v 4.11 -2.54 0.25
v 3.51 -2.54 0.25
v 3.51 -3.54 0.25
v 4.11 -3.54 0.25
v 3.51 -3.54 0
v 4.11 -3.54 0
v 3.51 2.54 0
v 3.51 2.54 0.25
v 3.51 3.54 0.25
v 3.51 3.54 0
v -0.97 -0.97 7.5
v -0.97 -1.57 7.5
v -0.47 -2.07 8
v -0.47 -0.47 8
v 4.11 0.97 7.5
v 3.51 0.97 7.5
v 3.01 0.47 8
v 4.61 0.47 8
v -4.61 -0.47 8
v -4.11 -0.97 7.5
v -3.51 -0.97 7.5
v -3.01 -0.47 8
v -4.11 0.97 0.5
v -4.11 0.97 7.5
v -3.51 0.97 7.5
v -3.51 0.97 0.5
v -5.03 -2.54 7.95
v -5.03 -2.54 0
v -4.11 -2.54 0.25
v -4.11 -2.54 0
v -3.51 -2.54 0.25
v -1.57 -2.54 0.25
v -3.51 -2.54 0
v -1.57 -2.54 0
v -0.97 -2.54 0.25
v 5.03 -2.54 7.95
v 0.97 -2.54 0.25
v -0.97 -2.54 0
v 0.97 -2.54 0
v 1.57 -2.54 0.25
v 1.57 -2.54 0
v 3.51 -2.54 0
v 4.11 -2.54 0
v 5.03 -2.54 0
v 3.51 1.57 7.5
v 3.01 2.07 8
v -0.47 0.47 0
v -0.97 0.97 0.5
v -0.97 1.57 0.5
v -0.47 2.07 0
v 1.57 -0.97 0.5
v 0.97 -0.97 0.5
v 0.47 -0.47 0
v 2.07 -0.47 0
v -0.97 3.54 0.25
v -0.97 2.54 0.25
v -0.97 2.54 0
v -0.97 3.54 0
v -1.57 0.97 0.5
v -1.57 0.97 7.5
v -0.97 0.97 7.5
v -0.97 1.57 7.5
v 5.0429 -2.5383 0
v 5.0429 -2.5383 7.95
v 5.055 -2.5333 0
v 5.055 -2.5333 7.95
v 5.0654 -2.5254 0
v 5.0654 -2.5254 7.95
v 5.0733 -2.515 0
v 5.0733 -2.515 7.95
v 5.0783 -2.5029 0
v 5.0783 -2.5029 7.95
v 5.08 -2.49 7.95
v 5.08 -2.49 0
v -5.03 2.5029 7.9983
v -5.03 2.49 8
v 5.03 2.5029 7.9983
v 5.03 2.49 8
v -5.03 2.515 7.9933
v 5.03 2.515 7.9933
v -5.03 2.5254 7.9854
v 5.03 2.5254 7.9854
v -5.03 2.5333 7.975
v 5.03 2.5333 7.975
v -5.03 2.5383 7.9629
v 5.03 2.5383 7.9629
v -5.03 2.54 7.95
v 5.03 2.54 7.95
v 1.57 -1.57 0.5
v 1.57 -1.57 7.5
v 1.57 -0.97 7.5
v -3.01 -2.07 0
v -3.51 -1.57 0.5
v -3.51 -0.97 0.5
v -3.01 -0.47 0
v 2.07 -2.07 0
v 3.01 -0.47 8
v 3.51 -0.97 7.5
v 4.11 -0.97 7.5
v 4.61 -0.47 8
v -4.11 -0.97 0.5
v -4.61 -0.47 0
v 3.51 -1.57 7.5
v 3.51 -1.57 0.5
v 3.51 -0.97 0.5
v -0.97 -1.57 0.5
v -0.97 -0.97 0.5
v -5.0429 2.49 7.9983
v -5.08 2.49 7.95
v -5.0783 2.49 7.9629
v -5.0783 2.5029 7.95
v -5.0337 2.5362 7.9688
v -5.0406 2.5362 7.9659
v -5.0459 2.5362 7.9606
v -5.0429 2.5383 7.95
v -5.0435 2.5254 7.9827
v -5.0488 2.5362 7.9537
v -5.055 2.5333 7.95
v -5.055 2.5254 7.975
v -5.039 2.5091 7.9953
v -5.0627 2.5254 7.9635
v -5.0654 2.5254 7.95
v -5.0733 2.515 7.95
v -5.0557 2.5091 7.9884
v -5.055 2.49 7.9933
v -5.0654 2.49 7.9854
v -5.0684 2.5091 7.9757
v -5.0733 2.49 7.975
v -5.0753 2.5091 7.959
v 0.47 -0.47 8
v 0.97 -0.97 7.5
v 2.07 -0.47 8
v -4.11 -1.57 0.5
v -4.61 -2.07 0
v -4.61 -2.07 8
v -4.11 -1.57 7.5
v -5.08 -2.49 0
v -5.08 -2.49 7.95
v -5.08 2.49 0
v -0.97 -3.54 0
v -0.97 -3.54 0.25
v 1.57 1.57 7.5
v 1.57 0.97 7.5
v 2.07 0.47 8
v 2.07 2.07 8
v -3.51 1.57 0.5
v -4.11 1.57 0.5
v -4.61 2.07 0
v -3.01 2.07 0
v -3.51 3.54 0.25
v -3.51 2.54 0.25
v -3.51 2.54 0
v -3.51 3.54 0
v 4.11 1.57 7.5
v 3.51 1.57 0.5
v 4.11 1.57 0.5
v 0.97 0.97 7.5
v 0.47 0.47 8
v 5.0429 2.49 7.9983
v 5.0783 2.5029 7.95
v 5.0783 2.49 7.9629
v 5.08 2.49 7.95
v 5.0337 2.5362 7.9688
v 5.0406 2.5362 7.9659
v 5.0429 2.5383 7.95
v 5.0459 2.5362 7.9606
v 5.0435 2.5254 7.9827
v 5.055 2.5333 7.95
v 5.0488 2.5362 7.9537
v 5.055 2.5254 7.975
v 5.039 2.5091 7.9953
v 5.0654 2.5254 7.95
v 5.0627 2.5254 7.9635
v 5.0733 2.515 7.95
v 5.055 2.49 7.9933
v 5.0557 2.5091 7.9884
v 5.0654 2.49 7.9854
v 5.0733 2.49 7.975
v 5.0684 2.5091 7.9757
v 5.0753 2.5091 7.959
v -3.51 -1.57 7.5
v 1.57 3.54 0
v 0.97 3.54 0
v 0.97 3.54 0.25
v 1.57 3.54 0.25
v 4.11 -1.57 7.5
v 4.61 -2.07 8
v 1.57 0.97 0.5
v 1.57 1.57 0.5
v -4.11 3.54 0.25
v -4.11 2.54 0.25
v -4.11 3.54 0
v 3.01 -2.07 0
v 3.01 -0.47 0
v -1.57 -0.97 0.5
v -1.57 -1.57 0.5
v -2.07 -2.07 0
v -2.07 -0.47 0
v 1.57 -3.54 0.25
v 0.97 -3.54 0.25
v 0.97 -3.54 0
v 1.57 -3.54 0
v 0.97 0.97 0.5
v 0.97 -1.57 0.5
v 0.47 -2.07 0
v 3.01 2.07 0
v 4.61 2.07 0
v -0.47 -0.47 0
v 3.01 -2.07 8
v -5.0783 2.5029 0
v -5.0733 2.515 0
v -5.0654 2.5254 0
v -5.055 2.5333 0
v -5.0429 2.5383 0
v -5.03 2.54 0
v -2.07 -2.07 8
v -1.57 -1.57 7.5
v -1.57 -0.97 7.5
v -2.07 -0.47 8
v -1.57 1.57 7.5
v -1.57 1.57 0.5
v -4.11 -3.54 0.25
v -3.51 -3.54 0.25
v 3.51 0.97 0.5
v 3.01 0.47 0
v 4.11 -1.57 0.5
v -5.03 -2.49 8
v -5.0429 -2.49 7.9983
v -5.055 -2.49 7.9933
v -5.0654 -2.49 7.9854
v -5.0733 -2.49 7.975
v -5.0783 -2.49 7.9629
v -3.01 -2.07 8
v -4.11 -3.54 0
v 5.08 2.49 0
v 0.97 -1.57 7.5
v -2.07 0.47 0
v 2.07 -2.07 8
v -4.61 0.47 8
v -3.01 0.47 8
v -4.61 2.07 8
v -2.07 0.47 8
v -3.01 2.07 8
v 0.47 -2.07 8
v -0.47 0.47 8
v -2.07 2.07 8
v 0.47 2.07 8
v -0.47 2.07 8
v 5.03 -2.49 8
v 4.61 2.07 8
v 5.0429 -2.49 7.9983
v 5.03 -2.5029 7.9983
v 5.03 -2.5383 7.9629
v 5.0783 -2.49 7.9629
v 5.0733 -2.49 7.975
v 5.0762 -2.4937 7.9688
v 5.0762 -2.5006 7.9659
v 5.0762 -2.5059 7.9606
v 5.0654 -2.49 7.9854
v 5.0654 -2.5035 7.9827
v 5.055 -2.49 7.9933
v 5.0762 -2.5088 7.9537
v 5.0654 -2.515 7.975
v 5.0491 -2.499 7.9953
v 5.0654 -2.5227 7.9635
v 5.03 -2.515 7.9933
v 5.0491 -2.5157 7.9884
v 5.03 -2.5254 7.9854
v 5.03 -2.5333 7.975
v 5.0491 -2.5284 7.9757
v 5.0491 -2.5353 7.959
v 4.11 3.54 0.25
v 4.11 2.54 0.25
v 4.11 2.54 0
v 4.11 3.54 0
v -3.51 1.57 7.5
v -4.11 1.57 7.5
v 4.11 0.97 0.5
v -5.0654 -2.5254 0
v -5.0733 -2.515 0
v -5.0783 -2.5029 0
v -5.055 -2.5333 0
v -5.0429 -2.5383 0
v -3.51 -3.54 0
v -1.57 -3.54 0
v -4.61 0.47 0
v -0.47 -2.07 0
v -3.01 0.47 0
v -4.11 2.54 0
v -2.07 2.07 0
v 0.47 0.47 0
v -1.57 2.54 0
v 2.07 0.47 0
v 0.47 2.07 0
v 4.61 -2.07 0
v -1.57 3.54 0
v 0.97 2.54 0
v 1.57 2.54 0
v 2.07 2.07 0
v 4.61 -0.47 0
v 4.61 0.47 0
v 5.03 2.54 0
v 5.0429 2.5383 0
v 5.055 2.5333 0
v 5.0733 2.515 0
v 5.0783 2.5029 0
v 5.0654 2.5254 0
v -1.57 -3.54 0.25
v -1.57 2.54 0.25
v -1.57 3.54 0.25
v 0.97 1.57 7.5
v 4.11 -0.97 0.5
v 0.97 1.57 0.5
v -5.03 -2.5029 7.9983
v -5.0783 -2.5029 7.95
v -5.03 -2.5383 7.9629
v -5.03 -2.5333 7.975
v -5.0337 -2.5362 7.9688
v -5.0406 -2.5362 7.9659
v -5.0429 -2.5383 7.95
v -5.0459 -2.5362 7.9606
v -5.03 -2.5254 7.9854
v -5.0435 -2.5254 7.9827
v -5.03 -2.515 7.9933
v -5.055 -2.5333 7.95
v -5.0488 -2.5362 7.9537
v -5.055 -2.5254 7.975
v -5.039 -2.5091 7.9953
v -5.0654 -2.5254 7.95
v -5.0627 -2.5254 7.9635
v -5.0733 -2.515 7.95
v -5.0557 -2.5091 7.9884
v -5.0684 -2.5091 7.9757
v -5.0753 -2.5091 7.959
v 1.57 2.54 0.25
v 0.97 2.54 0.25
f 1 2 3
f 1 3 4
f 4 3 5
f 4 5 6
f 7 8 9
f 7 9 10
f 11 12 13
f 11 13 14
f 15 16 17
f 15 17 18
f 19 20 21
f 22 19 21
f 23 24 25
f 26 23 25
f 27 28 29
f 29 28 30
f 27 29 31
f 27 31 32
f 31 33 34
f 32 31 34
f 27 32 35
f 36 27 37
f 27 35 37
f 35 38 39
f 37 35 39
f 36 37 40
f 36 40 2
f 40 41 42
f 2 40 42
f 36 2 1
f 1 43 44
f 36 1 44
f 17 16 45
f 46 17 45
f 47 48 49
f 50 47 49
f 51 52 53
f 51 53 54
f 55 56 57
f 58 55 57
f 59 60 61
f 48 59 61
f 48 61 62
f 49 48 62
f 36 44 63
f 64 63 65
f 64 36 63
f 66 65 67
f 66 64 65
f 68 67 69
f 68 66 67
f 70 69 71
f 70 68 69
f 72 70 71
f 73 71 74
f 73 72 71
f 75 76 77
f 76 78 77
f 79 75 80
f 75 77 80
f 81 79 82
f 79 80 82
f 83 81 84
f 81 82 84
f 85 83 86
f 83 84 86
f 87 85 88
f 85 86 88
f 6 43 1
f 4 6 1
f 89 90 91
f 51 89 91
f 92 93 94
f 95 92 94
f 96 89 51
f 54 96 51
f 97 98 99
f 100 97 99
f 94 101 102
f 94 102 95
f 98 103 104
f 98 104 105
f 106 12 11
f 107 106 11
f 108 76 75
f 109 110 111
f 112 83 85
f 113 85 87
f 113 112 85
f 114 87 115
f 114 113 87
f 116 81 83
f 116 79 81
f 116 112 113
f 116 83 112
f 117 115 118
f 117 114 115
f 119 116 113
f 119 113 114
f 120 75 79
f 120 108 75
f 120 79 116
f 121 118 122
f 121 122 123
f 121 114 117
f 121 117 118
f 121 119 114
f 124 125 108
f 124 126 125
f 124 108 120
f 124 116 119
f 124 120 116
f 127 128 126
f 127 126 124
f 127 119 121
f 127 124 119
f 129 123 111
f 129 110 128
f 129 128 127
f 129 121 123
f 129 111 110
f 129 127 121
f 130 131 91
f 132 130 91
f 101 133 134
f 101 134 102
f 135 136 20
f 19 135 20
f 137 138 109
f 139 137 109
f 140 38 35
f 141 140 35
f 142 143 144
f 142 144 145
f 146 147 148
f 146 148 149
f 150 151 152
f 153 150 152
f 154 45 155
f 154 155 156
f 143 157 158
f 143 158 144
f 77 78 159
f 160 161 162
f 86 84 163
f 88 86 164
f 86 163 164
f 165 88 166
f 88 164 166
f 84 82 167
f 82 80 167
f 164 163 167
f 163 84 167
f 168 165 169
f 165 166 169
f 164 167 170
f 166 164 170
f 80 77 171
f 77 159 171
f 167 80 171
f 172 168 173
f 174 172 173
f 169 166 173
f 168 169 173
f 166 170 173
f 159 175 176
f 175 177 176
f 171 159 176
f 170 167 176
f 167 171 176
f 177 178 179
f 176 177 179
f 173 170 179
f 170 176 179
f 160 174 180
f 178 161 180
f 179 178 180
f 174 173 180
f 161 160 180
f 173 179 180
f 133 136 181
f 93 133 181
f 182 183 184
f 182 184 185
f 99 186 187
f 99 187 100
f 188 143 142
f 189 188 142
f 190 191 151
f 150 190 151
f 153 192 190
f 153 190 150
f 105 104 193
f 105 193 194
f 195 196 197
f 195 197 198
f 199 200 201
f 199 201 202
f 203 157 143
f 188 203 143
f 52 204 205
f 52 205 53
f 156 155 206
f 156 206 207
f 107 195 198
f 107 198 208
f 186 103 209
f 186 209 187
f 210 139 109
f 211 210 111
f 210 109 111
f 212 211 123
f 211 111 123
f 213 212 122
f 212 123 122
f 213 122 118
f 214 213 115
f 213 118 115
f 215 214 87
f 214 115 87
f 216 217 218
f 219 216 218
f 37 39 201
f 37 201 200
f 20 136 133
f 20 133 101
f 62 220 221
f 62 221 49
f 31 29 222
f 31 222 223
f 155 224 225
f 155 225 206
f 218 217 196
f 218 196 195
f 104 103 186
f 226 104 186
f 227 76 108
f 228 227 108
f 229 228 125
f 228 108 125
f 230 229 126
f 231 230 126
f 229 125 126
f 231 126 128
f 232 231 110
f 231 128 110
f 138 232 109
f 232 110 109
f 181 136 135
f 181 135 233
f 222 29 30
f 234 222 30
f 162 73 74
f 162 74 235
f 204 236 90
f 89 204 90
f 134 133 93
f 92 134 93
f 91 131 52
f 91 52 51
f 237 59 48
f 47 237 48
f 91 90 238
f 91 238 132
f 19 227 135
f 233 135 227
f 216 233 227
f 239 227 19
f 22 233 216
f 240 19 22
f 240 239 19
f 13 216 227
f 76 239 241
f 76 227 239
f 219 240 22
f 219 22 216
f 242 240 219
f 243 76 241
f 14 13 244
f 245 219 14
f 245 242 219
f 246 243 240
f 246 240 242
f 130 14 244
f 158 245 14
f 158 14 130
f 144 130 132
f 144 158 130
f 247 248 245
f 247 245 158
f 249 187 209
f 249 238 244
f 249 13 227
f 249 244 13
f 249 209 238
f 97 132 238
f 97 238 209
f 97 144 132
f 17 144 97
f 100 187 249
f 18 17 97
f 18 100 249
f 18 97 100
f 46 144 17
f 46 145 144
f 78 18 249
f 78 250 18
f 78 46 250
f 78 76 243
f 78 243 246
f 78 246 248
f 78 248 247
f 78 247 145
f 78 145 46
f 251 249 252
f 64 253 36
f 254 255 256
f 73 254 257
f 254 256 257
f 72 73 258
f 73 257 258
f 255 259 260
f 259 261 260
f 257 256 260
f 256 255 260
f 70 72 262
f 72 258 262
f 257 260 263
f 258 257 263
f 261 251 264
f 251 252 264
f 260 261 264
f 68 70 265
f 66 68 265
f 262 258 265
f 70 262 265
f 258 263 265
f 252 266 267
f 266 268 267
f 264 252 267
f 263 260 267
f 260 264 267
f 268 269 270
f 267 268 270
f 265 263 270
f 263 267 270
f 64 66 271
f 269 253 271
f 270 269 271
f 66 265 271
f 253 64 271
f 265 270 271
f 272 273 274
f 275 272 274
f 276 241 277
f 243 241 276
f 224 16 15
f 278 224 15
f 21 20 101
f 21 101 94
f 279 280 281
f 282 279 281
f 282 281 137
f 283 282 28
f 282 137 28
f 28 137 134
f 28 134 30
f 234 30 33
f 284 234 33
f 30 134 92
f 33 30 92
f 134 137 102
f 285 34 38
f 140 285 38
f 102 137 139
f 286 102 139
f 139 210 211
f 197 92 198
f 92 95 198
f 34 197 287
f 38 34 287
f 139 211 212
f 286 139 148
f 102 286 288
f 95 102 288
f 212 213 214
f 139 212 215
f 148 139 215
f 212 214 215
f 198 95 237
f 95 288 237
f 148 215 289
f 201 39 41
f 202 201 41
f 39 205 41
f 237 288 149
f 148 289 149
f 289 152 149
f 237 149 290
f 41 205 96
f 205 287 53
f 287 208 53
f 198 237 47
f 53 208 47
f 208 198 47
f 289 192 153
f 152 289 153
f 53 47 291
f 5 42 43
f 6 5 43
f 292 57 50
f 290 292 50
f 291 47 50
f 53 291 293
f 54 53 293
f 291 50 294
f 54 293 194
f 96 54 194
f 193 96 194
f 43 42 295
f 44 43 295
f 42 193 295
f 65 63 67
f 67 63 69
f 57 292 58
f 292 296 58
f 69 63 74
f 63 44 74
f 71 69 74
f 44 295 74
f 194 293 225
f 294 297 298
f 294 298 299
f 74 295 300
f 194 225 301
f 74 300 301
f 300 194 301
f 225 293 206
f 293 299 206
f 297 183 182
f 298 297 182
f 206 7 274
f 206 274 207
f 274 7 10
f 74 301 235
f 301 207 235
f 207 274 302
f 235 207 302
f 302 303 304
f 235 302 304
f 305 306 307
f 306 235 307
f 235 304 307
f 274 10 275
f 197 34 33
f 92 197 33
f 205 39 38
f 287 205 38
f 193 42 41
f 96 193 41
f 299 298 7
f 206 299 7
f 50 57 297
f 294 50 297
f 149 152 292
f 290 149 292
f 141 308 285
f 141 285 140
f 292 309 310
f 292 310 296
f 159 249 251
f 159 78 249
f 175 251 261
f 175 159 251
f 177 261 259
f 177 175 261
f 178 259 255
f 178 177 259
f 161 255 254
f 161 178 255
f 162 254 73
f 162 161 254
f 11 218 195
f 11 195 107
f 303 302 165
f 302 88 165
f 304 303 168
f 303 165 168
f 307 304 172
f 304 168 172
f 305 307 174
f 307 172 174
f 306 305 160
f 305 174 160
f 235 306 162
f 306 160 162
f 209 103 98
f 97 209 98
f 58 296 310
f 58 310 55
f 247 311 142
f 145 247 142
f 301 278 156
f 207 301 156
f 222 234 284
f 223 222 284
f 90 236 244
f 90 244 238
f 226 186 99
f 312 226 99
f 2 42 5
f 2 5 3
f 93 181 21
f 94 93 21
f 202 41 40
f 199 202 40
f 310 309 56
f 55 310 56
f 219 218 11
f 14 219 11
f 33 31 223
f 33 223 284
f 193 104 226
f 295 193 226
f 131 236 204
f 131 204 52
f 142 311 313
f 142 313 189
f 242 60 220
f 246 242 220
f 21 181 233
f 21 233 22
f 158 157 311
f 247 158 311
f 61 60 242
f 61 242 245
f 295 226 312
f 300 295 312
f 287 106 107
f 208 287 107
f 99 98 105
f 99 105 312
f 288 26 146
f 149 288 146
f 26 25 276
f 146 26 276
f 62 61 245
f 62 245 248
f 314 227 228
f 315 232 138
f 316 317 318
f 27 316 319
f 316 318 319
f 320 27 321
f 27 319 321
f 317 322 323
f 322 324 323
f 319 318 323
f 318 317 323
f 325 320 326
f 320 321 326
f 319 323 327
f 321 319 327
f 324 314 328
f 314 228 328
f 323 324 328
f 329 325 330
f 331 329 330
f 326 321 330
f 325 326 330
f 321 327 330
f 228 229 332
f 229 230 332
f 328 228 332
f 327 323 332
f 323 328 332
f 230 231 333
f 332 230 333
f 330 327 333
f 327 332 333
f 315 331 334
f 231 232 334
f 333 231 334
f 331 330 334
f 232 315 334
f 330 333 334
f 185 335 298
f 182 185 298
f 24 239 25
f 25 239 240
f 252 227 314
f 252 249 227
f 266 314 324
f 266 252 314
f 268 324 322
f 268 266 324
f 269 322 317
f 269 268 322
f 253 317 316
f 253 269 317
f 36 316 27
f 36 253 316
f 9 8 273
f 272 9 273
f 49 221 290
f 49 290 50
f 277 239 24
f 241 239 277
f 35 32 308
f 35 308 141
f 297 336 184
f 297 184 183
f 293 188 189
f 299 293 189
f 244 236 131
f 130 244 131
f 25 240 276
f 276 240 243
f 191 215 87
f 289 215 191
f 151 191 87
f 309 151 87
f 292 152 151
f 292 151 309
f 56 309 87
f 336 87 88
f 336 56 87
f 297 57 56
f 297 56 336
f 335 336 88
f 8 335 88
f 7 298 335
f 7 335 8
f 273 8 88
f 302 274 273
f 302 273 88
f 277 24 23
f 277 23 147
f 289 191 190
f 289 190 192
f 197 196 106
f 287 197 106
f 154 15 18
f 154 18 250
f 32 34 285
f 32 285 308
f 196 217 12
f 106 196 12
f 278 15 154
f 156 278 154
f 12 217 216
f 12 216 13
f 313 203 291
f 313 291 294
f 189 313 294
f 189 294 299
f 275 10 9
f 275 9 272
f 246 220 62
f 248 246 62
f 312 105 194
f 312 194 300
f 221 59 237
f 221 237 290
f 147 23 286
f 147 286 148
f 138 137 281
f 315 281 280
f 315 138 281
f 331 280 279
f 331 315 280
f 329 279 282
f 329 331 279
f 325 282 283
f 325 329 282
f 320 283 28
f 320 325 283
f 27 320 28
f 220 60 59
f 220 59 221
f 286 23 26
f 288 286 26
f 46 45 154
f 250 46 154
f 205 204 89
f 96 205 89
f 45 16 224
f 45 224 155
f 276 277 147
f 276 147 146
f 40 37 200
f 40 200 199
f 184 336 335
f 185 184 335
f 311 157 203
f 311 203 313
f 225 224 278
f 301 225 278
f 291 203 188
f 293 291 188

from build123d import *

# Parameters (mm, degrees)
SKETCH_1_W               = 10.16
SKETCH_1_H               = 5.08
EXTRUDE_1_DEPTH          = 8
SKETCH_2_W               = 0.6
SKETCH_2_H               = 0.6
CUT_EXTRUDE_1_DEPTH      = 10.811116144
CHAMFER_1_SIZE           = 0.5
CHAMFER_2_SIZE           = 0.5
FILLET_1_R               = 0.05
SKETCH_4_W               = 0.6
SKETCH_4_H               = 0.25
EXTRUDE_3_DEPTH          = 1
PATTERN_LINEAR_2_COUNT   = 4
PATTERN_LINEAR_2_PITCH   = 2.54
MIRROR_1_COPY_1_SKETCH_W = 0.6
MIRROR_1_COPY_1_SKETCH_H = 0.25
MIRROR_1_COPY_1_DEPTH    = 1
MIRROR_1_COPY_2_SKETCH_W = 0.6
MIRROR_1_COPY_2_SKETCH_H = 0.25
MIRROR_1_COPY_2_DEPTH    = 1
MIRROR_1_COPY_3_SKETCH_W = 0.6
MIRROR_1_COPY_3_SKETCH_H = 0.25
MIRROR_1_COPY_3_DEPTH    = 1


with BuildPart() as part:
    # 草图1 → 凸台-拉伸1 (new body)
    with BuildSketch(Plane.XY):
        Rectangle(SKETCH_1_W, SKETCH_1_H)
    extrude(amount=EXTRUDE_1_DEPTH)

    # 草图2 → 切除-拉伸1 (cut, through all)
    with BuildSketch(Plane.XY.offset(8)):
        with Locations((1.27, 1.27)):
            Rectangle(SKETCH_2_W, SKETCH_2_H)
        with Locations((-1.27, 1.27)):
            Rectangle(SKETCH_2_W, SKETCH_2_H)
        with Locations((3.81, 1.27)):
            Rectangle(SKETCH_2_W, SKETCH_2_H)
        with Locations((-1.27, -1.27)):
            Rectangle(SKETCH_2_W, SKETCH_2_H)
        with Locations((1.27, -1.27)):
            Rectangle(SKETCH_2_W, SKETCH_2_H)
        with Locations((3.81, -1.27)):
            Rectangle(SKETCH_2_W, SKETCH_2_H)
        with Locations((-3.81, -1.27)):
            Rectangle(SKETCH_2_W, SKETCH_2_H)
        with Locations((-3.81, 1.27)):
            Rectangle(SKETCH_2_W, SKETCH_2_H)
    extrude(amount=-CUT_EXTRUDE_1_DEPTH, mode=Mode.SUBTRACT)

    # 倒角1
    chamfer_1_edges = [part.edges().sort_by_distance(p)[0] for p in [
        (-3.81, 1.57, 0),
        (-3.51, 1.27, 0),
        (-3.81, 0.97, 0),
        (-4.11, 1.27, 0),
        (-0.97, 1.27, 0),
        (-1.27, 0.97, 0),
        (-1.57, 1.27, 0),
        (-1.27, 1.57, 0),
        (1.57, 1.27, 0),
        (1.27, 0.97, 0),
        (0.97, 1.27, 0),
        (1.27, 1.57, 0),
        (-3.81, -0.97, 0),
        (-3.51, -1.27, 0),
        (-3.81, -1.57, 0),
        (-4.11, -1.27, 0),
        (4.11, 1.27, 0),
        (3.81, 0.97, 0),
        (3.51, 1.27, 0),
        (3.81, 1.57, 0),
        (-0.97, -1.27, 0),
        (-1.27, -1.57, 0),
        (-1.57, -1.27, 0),
        (-1.27, -0.97, 0),
        (1.57, -1.27, 0),
        (1.27, -1.57, 0),
        (0.97, -1.27, 0),
        (1.27, -0.97, 0),
        (4.11, -1.27, 0),
        (3.81, -1.57, 0),
        (3.51, -1.27, 0),
        (3.81, -0.97, 0),
        (4.11, -1.27, 8),
        (3.81, -0.97, 8),
        (3.51, -1.27, 8),
        (3.81, -1.57, 8),
    ]]
    chamfer(chamfer_1_edges, length=CHAMFER_1_SIZE)

    # 倒角2
    chamfer_2_edges = [part.edges().sort_by_distance(p)[0] for p in [
        (-3.81, 1.57, 8),
        (-4.11, 1.27, 8),
        (-3.81, 0.97, 8),
        (-3.51, 1.27, 8),
        (-0.97, 1.27, 8),
        (-1.27, 1.57, 8),
        (-1.57, 1.27, 8),
        (-1.27, 0.97, 8),
        (1.57, 1.27, 8),
        (1.27, 1.57, 8),
        (0.97, 1.27, 8),
        (1.27, 0.97, 8),
        (-3.81, -0.97, 8),
        (-4.11, -1.27, 8),
        (-3.81, -1.57, 8),
        (-3.51, -1.27, 8),
        (4.11, 1.27, 8),
        (3.81, 1.57, 8),
        (3.51, 1.27, 8),
        (3.81, 0.97, 8),
        (-0.97, -1.27, 8),
        (-1.27, -0.97, 8),
        (-1.57, -1.27, 8),
        (-1.27, -1.57, 8),
        (1.57, -1.27, 8),
        (1.27, -0.97, 8),
        (0.97, -1.27, 8),
        (1.27, -1.57, 8),
    ]]
    chamfer(chamfer_2_edges, length=CHAMFER_2_SIZE)

    # 圆角1
    fillet_1_edges = [part.edges().sort_by_distance(p)[0] for p in [
        (-5.08, 0, 8),
        (0, -2.54, 8),
        (5.08, 0, 8),
        (0, 2.54, 8),
        (5.08, -2.54, 4),
        (-5.08, -2.54, 4),
        (-5.08, 2.54, 4),
        (5.08, 2.54, 4),
    ]]
    fillet(fillet_1_edges, radius=FILLET_1_R)

    # 草图4 → 凸台-拉伸3 (add)
    with BuildSketch(Plane(origin=(0, 2.54, 0), x_dir=(1, 0, 0), z_dir=(0, 1, 0))):
        with Locations((-3.81, -0.125)):
            Rectangle(SKETCH_4_W, SKETCH_4_H)
    extrude_3 = extrude(amount=EXTRUDE_3_DEPTH)

    # 阵列(线性)2: 凸台-拉伸3 ×4
    with Locations(*[(i * PATTERN_LINEAR_2_PITCH, 0, 0) for i in range(1, PATTERN_LINEAR_2_COUNT)]):
        add(extrude_3)

    # 镜向1: 凸台-拉伸3 across plane
    add(extrude_3.mirror(Plane.ZX))

    # 镜向1 copy 1 sketch → 镜向1 copy 1 (add)
    with BuildSketch(Plane(origin=(2.54, -2.54, 0), x_dir=(1, 0, 0), z_dir=(0, -1, 0))):
        with Locations((-3.81, 0.125)):
            Rectangle(MIRROR_1_COPY_1_SKETCH_W, MIRROR_1_COPY_1_SKETCH_H)
    extrude(amount=MIRROR_1_COPY_1_DEPTH)

    # 镜向1 copy 2 sketch → 镜向1 copy 2 (add)
    with BuildSketch(Plane(origin=(5.08, -2.54, 0), x_dir=(1, 0, 0), z_dir=(0, -1, 0))):
        with Locations((-3.81, 0.125)):
            Rectangle(MIRROR_1_COPY_2_SKETCH_W, MIRROR_1_COPY_2_SKETCH_H)
    extrude(amount=MIRROR_1_COPY_2_DEPTH)

    # 镜向1 copy 3 sketch → 镜向1 copy 3 (add)
    with BuildSketch(Plane(origin=(7.62, -2.54, 0), x_dir=(1, 0, 0), z_dir=(0, -1, 0))):
        with Locations((-3.81, 0.125)):
            Rectangle(MIRROR_1_COPY_3_SKETCH_W, MIRROR_1_COPY_3_SKETCH_H)
    extrude(amount=MIRROR_1_COPY_3_DEPTH)


solid = part.part
